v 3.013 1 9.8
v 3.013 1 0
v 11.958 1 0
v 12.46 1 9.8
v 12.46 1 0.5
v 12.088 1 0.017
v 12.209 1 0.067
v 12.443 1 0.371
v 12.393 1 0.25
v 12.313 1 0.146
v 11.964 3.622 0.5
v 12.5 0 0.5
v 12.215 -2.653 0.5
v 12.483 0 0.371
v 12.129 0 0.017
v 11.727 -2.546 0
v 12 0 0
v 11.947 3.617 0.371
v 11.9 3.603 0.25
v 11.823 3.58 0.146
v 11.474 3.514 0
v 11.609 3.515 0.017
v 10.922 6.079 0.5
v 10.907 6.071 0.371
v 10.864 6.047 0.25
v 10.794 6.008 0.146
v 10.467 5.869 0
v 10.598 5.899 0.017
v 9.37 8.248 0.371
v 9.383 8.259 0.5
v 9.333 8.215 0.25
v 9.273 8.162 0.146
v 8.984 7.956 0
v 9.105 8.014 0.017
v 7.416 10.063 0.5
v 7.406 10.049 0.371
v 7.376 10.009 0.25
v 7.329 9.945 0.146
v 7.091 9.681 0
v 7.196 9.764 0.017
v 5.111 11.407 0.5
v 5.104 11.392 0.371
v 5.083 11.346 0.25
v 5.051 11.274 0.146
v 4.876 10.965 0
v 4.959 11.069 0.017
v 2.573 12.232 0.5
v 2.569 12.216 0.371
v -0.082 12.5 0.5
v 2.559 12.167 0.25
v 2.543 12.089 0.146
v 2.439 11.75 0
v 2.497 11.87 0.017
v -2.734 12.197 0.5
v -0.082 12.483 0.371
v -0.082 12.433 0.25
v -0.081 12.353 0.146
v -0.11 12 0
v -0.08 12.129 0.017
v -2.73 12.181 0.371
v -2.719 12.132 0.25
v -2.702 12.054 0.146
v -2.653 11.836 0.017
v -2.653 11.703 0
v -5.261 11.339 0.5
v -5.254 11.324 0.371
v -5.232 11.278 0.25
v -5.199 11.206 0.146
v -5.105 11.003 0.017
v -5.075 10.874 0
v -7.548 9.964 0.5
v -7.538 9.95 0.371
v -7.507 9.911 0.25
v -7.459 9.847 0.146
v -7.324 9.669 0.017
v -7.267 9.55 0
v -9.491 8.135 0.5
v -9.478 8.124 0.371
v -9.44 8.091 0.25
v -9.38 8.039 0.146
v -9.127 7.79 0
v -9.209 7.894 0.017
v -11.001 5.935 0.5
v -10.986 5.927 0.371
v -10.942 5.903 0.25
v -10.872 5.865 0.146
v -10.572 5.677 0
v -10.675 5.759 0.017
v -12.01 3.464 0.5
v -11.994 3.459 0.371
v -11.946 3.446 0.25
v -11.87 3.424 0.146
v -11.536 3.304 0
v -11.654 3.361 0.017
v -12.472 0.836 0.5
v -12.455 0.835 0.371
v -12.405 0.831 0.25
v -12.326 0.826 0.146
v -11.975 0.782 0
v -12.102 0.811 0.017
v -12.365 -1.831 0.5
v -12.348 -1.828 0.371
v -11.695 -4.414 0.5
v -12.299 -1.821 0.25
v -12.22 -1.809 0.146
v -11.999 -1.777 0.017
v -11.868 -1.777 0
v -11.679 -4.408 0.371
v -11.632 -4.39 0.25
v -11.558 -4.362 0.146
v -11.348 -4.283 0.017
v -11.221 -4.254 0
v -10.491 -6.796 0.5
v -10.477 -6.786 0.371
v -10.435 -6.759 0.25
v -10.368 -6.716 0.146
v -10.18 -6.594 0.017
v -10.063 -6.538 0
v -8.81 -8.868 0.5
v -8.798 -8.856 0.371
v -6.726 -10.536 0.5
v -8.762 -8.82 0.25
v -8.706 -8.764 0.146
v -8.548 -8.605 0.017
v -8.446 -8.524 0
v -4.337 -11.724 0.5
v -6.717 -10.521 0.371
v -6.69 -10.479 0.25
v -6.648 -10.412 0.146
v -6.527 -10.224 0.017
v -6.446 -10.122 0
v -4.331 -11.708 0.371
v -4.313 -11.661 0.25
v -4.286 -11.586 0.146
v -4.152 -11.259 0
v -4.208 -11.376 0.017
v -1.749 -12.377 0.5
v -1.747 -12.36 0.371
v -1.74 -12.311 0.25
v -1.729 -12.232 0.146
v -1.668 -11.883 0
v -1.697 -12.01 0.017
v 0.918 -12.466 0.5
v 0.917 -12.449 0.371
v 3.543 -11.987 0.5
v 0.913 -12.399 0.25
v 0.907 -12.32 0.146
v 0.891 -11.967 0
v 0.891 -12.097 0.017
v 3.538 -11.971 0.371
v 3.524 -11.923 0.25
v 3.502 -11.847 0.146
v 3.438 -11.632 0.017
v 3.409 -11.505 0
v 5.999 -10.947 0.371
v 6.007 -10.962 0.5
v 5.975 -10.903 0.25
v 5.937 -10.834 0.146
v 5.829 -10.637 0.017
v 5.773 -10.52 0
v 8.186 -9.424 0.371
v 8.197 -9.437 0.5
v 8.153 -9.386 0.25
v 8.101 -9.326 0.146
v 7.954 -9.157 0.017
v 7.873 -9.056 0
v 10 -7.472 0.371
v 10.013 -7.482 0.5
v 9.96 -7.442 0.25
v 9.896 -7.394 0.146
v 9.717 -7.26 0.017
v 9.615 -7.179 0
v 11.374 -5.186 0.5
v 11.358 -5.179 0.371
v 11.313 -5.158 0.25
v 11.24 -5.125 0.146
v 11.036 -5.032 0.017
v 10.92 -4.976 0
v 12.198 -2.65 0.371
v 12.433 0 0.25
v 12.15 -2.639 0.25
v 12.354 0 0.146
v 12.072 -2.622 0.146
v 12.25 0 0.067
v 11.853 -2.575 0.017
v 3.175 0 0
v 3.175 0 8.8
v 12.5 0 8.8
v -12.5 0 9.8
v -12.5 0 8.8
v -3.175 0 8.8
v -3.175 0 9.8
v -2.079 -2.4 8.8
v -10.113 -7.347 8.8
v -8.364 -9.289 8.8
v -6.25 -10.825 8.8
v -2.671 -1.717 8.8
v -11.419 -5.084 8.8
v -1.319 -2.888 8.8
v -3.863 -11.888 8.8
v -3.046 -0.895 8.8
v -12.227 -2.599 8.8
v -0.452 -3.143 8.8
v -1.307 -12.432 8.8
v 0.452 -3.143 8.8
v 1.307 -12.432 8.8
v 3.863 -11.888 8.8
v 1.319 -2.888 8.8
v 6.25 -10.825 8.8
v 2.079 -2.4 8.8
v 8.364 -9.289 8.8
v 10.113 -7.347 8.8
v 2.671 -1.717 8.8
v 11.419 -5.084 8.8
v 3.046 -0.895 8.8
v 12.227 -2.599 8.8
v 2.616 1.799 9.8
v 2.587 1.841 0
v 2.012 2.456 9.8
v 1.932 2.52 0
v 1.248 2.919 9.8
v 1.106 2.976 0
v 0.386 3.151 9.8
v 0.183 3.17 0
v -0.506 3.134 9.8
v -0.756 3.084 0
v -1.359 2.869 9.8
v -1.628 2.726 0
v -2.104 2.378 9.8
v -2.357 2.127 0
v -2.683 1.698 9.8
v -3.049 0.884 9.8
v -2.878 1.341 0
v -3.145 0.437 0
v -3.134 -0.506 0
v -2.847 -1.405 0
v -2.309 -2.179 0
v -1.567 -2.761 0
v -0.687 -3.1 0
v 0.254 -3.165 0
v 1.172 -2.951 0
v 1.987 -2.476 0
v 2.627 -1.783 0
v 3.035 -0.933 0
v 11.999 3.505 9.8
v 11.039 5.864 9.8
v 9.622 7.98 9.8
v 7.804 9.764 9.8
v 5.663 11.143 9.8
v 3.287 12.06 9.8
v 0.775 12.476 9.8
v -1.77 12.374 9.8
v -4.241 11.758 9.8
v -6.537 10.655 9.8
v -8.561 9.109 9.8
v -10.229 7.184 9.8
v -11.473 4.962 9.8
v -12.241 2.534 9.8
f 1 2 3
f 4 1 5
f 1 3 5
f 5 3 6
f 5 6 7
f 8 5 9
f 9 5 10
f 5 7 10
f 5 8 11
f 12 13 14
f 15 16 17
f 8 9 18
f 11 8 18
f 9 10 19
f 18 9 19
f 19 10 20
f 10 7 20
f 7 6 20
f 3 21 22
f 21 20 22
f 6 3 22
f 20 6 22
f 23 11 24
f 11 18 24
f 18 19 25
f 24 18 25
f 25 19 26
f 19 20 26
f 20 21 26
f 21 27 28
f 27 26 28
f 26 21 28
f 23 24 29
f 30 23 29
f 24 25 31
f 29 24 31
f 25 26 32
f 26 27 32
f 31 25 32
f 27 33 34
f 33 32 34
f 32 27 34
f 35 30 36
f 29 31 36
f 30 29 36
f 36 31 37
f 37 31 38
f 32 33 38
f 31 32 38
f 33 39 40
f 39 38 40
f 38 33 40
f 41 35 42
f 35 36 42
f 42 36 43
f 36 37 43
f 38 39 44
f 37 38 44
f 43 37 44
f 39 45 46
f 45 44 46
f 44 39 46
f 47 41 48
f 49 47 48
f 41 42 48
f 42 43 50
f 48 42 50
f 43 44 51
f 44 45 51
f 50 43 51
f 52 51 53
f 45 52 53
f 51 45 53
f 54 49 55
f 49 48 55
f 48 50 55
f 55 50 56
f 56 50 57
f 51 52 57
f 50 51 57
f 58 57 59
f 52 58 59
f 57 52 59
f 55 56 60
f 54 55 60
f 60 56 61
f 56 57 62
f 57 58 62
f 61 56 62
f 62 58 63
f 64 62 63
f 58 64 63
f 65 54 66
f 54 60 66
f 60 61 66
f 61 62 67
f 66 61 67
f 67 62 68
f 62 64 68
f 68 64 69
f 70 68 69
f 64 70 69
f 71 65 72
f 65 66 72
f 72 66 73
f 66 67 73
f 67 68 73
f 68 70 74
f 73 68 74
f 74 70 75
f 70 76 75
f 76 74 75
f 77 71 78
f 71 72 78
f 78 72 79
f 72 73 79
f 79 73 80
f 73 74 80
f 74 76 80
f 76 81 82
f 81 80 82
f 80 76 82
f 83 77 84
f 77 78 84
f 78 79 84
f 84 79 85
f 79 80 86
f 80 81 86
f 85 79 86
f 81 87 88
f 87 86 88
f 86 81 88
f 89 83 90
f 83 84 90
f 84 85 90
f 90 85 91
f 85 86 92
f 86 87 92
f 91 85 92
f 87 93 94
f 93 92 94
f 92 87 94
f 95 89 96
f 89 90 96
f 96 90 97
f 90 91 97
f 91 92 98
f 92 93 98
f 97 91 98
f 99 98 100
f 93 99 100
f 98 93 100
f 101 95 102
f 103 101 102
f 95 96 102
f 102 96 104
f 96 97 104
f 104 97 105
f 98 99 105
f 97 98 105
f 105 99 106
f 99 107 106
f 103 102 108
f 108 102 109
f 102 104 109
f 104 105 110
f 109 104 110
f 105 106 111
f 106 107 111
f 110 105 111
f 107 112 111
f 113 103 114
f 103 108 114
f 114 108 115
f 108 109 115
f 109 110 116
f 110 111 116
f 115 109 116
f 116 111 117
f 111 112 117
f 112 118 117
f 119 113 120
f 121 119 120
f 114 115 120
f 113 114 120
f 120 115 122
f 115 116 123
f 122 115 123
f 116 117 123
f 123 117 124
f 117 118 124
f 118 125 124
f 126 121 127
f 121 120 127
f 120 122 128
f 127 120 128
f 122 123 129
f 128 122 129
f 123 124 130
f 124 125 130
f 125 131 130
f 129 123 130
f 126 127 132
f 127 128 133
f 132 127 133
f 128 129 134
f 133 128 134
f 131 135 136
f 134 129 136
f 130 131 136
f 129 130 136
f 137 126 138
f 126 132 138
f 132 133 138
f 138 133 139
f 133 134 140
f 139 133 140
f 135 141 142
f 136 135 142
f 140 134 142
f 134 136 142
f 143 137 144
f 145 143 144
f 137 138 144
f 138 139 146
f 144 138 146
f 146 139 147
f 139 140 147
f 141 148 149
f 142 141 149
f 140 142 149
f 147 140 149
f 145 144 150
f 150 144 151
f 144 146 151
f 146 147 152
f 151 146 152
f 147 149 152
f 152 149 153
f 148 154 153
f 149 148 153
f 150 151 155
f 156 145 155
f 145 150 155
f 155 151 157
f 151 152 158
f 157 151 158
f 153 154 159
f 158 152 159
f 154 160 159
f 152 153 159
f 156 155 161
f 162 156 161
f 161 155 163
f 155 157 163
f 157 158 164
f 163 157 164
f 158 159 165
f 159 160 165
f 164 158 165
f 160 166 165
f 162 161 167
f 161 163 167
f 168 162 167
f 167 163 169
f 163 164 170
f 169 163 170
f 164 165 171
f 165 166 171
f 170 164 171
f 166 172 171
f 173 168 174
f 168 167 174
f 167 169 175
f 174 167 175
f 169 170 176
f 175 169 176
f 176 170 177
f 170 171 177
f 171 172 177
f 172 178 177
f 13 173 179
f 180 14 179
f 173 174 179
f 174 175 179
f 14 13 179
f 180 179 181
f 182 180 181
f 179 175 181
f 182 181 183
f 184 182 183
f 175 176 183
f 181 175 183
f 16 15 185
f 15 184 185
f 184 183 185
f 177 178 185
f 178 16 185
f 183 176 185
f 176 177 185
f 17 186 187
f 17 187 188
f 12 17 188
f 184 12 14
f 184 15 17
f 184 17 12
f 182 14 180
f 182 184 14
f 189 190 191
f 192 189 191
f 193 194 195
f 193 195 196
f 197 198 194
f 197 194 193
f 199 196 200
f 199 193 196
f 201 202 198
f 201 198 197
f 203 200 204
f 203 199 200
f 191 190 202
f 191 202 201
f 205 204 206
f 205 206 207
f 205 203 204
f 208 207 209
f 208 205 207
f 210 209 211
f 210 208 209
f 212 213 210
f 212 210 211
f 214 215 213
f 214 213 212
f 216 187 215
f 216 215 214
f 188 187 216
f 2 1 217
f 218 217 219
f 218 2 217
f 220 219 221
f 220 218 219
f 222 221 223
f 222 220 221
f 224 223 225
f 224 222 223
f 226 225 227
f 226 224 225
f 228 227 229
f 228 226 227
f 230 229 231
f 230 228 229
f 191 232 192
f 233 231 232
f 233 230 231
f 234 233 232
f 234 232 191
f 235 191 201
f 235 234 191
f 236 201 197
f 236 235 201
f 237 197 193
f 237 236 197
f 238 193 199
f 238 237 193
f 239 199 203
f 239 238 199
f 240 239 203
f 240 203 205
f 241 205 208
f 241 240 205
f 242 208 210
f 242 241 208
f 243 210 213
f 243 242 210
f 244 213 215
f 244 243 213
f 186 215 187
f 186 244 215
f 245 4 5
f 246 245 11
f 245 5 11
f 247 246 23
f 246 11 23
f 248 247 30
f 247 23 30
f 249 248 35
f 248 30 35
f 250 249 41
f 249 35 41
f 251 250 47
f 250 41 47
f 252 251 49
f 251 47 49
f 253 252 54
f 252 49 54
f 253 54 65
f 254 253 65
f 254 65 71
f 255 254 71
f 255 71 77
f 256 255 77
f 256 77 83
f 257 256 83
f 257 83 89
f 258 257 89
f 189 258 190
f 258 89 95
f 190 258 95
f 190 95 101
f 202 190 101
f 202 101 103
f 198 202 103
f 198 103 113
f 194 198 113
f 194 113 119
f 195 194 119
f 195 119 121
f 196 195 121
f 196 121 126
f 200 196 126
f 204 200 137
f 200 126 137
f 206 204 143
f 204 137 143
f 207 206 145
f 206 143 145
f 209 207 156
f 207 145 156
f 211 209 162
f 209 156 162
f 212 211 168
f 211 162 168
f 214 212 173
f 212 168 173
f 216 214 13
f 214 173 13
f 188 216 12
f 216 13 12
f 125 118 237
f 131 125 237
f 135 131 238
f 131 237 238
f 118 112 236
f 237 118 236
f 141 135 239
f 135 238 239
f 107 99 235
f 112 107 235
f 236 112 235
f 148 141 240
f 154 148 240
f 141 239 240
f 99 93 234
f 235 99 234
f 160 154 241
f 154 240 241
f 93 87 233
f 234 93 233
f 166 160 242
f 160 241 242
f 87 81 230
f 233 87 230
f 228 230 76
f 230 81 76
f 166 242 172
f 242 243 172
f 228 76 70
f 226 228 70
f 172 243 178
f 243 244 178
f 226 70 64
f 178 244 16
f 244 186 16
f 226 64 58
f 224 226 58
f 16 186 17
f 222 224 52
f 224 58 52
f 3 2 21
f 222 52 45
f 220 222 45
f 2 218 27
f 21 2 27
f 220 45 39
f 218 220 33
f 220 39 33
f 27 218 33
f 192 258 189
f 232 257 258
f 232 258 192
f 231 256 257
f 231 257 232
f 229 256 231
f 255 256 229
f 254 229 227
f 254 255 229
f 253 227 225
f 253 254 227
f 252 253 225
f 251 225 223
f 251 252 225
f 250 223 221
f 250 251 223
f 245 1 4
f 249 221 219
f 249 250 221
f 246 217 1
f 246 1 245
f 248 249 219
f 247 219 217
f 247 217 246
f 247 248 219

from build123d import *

# Parameters (mm, degrees)
SKETCH001_R   = 12.5
SKETCH001_R_2 = 3.175
PAD_DEPTH     = 8.8
PAD002_DEPTH  = 1
FILLET_R      = 0.5
SKETCH007_W   = 9.8
SKETCH007_H   = 1
POCKET_DEPTH  = 9.8


with BuildPart() as part:
    # Sketch001 → Pad (new body)
    with BuildSketch(Plane.XY):
        Circle(SKETCH001_R)
        Circle(SKETCH001_R_2, mode=Mode.SUBTRACT)
    extrude(amount=PAD_DEPTH)

    # Sketch003 → Pad002 (new body)
    with BuildSketch(Plane.XY.offset(8.8)):
        with BuildLine():
            Line((-12.5, 0), (-3.175, 0))
            ThreePointArc((3.175, 0), (0, 3.175), (-3.175, 0))
            Line((3.175, 0), (12.5, 0))
            ThreePointArc((12.5, 0), (0, 12.5), (-12.5, 0))
        make_face()
    extrude(amount=PAD002_DEPTH)

    # Fillet
    fillet_edges = [part.edges().sort_by_distance(p)[0] for p in [
        (-12.5, 0, 0),
    ]]
    fillet(fillet_edges, radius=FILLET_R)

    # Sketch007 → Pocket (cut)
    with BuildSketch(Plane(origin=(0, 0, 0), x_dir=(1, 0, 0), z_dir=(0, 0, -1))):
        with Locations((7.7, -0.5)):
            Rectangle(SKETCH007_W, SKETCH007_H)
    extrude(amount=-POCKET_DEPTH, mode=Mode.SUBTRACT)


solid = part.part
